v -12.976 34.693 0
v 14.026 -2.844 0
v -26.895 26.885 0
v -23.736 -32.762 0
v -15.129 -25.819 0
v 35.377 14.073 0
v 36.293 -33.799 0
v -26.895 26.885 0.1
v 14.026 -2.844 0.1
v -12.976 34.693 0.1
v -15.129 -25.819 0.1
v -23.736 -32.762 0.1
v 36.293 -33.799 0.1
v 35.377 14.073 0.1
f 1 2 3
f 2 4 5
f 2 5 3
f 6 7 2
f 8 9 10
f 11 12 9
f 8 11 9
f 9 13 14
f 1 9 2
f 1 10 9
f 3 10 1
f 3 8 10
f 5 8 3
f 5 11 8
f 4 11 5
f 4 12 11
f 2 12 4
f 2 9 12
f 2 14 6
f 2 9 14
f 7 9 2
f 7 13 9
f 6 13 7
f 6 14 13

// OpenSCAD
$fn=8;
a=[for (p=[0:5])rands(-50,50,2)];
a2=[for (p=[0:5])rands(-30,30,2)];
b=    pair (a);
 linear_extrude(0.1)polygon(a);
 
clips=clipself(b);
c=offset(clips,0);

 polyline(c,"red");

for(c=clips)echo (c);
 

function pair(a)=[for (p=[0:len(a)-1])[a[p],a[(p+1)%len(a)]]];
 
function clipself(n)=
let( kres=
[for(l=n)
    [  [0,l[0].x,l[0].y], for(ll=n) 
        if(l!=ll) let(res=IntersectionOfLines(l,ll))if (!is_undef(res))[norm(res-l[0]),res.x,res.y] ] 
        
    
    ],
        sortedpoints=specialsort(kres)
        
        )
        
        pair( flatten (sortedpoints))
        ;
        
        function specialsort(v)=
        
        let(res= [for(i=v)  quicksort_col(i)])  
        let(res= [for(i=res) [for(j=i) [ j.y,j.z]]])
      
              res 
        ;
        
       function quicksort_col(list,col=0)= 
!(len(list)>0)?[]:
let(
pivot = list[floor(len(list)/2)][col],
list_lesser =[ for(i=[0:len(list)-1])if( list[i][col] < pivot )list[i] ],
list_equal  =[ for(i=[0:len(list)-1])if( list[i][col]== pivot )list[i] ],
list_greater=[ for(i=[0:len(list)-1])if( list[i][col] > pivot )list[i] ])

concat(
quicksort_col(list_lesser),
list_equal,
quicksort_col(list_greater));
        
        
        
        
        function flatten(v)=[for(n=v)for( nn=n)nn];
 
module polyline(n,c="blue")
        
{ 
    for(b=n)color(rands(0,1,3))line(b.x,b.y);
}




module line(a,b) {
     hull(){
translate(a)circle(0.5);translate(b)circle(0.5);}
     }
     
function offset(n,r=0)=
         
         [for(b=n) b + dup(CCW(normal(b[1]-b[0]))*r)        ];
         
         
         
         function dup(a)=[a,a];
 function normal (n)=n/max(norm(n),10e-32);
 function CCW(v)=[v.y,-v.x];
         
         
         
         
         
         
         function  IntersectionOfLines(pa, pb)=
         
let(
         pa1=pa[0],
         pa2=pa[1],
         pb1=pb[0],
         pb2=pb[1])
pa2==pb1||pb2==pa1||
pa1==pb2||pb1==pa2
         
         ?undef:

let(
         
da = [(pa1.x-pa2.x),(pa1.y-pa2.y)], 
db = [(pb1.x-pb2.x),(pb1.y-pb2.y)],
the = da.x*db.y - da.y*db.x                 )
(the == 0)? 
undef: /* no in tersection*/
let (
A = (pa1.x * pa2.y - pa1.y * pa2.x),
B = (pb1.x * pb2.y - pb1.y * pb2.x)        ,
P= [( A*db.x - da.x*B ) / the , ( A*db.y - da.y*B ) / the])
P.x< max(pa1.x,pa2.x) && P.x > min(pa1.x , pa2.x)&&
P.x< max(pb1.x,pb2.x) && P.x > min(pb1.x , pb2.x)

?P:undef

;
